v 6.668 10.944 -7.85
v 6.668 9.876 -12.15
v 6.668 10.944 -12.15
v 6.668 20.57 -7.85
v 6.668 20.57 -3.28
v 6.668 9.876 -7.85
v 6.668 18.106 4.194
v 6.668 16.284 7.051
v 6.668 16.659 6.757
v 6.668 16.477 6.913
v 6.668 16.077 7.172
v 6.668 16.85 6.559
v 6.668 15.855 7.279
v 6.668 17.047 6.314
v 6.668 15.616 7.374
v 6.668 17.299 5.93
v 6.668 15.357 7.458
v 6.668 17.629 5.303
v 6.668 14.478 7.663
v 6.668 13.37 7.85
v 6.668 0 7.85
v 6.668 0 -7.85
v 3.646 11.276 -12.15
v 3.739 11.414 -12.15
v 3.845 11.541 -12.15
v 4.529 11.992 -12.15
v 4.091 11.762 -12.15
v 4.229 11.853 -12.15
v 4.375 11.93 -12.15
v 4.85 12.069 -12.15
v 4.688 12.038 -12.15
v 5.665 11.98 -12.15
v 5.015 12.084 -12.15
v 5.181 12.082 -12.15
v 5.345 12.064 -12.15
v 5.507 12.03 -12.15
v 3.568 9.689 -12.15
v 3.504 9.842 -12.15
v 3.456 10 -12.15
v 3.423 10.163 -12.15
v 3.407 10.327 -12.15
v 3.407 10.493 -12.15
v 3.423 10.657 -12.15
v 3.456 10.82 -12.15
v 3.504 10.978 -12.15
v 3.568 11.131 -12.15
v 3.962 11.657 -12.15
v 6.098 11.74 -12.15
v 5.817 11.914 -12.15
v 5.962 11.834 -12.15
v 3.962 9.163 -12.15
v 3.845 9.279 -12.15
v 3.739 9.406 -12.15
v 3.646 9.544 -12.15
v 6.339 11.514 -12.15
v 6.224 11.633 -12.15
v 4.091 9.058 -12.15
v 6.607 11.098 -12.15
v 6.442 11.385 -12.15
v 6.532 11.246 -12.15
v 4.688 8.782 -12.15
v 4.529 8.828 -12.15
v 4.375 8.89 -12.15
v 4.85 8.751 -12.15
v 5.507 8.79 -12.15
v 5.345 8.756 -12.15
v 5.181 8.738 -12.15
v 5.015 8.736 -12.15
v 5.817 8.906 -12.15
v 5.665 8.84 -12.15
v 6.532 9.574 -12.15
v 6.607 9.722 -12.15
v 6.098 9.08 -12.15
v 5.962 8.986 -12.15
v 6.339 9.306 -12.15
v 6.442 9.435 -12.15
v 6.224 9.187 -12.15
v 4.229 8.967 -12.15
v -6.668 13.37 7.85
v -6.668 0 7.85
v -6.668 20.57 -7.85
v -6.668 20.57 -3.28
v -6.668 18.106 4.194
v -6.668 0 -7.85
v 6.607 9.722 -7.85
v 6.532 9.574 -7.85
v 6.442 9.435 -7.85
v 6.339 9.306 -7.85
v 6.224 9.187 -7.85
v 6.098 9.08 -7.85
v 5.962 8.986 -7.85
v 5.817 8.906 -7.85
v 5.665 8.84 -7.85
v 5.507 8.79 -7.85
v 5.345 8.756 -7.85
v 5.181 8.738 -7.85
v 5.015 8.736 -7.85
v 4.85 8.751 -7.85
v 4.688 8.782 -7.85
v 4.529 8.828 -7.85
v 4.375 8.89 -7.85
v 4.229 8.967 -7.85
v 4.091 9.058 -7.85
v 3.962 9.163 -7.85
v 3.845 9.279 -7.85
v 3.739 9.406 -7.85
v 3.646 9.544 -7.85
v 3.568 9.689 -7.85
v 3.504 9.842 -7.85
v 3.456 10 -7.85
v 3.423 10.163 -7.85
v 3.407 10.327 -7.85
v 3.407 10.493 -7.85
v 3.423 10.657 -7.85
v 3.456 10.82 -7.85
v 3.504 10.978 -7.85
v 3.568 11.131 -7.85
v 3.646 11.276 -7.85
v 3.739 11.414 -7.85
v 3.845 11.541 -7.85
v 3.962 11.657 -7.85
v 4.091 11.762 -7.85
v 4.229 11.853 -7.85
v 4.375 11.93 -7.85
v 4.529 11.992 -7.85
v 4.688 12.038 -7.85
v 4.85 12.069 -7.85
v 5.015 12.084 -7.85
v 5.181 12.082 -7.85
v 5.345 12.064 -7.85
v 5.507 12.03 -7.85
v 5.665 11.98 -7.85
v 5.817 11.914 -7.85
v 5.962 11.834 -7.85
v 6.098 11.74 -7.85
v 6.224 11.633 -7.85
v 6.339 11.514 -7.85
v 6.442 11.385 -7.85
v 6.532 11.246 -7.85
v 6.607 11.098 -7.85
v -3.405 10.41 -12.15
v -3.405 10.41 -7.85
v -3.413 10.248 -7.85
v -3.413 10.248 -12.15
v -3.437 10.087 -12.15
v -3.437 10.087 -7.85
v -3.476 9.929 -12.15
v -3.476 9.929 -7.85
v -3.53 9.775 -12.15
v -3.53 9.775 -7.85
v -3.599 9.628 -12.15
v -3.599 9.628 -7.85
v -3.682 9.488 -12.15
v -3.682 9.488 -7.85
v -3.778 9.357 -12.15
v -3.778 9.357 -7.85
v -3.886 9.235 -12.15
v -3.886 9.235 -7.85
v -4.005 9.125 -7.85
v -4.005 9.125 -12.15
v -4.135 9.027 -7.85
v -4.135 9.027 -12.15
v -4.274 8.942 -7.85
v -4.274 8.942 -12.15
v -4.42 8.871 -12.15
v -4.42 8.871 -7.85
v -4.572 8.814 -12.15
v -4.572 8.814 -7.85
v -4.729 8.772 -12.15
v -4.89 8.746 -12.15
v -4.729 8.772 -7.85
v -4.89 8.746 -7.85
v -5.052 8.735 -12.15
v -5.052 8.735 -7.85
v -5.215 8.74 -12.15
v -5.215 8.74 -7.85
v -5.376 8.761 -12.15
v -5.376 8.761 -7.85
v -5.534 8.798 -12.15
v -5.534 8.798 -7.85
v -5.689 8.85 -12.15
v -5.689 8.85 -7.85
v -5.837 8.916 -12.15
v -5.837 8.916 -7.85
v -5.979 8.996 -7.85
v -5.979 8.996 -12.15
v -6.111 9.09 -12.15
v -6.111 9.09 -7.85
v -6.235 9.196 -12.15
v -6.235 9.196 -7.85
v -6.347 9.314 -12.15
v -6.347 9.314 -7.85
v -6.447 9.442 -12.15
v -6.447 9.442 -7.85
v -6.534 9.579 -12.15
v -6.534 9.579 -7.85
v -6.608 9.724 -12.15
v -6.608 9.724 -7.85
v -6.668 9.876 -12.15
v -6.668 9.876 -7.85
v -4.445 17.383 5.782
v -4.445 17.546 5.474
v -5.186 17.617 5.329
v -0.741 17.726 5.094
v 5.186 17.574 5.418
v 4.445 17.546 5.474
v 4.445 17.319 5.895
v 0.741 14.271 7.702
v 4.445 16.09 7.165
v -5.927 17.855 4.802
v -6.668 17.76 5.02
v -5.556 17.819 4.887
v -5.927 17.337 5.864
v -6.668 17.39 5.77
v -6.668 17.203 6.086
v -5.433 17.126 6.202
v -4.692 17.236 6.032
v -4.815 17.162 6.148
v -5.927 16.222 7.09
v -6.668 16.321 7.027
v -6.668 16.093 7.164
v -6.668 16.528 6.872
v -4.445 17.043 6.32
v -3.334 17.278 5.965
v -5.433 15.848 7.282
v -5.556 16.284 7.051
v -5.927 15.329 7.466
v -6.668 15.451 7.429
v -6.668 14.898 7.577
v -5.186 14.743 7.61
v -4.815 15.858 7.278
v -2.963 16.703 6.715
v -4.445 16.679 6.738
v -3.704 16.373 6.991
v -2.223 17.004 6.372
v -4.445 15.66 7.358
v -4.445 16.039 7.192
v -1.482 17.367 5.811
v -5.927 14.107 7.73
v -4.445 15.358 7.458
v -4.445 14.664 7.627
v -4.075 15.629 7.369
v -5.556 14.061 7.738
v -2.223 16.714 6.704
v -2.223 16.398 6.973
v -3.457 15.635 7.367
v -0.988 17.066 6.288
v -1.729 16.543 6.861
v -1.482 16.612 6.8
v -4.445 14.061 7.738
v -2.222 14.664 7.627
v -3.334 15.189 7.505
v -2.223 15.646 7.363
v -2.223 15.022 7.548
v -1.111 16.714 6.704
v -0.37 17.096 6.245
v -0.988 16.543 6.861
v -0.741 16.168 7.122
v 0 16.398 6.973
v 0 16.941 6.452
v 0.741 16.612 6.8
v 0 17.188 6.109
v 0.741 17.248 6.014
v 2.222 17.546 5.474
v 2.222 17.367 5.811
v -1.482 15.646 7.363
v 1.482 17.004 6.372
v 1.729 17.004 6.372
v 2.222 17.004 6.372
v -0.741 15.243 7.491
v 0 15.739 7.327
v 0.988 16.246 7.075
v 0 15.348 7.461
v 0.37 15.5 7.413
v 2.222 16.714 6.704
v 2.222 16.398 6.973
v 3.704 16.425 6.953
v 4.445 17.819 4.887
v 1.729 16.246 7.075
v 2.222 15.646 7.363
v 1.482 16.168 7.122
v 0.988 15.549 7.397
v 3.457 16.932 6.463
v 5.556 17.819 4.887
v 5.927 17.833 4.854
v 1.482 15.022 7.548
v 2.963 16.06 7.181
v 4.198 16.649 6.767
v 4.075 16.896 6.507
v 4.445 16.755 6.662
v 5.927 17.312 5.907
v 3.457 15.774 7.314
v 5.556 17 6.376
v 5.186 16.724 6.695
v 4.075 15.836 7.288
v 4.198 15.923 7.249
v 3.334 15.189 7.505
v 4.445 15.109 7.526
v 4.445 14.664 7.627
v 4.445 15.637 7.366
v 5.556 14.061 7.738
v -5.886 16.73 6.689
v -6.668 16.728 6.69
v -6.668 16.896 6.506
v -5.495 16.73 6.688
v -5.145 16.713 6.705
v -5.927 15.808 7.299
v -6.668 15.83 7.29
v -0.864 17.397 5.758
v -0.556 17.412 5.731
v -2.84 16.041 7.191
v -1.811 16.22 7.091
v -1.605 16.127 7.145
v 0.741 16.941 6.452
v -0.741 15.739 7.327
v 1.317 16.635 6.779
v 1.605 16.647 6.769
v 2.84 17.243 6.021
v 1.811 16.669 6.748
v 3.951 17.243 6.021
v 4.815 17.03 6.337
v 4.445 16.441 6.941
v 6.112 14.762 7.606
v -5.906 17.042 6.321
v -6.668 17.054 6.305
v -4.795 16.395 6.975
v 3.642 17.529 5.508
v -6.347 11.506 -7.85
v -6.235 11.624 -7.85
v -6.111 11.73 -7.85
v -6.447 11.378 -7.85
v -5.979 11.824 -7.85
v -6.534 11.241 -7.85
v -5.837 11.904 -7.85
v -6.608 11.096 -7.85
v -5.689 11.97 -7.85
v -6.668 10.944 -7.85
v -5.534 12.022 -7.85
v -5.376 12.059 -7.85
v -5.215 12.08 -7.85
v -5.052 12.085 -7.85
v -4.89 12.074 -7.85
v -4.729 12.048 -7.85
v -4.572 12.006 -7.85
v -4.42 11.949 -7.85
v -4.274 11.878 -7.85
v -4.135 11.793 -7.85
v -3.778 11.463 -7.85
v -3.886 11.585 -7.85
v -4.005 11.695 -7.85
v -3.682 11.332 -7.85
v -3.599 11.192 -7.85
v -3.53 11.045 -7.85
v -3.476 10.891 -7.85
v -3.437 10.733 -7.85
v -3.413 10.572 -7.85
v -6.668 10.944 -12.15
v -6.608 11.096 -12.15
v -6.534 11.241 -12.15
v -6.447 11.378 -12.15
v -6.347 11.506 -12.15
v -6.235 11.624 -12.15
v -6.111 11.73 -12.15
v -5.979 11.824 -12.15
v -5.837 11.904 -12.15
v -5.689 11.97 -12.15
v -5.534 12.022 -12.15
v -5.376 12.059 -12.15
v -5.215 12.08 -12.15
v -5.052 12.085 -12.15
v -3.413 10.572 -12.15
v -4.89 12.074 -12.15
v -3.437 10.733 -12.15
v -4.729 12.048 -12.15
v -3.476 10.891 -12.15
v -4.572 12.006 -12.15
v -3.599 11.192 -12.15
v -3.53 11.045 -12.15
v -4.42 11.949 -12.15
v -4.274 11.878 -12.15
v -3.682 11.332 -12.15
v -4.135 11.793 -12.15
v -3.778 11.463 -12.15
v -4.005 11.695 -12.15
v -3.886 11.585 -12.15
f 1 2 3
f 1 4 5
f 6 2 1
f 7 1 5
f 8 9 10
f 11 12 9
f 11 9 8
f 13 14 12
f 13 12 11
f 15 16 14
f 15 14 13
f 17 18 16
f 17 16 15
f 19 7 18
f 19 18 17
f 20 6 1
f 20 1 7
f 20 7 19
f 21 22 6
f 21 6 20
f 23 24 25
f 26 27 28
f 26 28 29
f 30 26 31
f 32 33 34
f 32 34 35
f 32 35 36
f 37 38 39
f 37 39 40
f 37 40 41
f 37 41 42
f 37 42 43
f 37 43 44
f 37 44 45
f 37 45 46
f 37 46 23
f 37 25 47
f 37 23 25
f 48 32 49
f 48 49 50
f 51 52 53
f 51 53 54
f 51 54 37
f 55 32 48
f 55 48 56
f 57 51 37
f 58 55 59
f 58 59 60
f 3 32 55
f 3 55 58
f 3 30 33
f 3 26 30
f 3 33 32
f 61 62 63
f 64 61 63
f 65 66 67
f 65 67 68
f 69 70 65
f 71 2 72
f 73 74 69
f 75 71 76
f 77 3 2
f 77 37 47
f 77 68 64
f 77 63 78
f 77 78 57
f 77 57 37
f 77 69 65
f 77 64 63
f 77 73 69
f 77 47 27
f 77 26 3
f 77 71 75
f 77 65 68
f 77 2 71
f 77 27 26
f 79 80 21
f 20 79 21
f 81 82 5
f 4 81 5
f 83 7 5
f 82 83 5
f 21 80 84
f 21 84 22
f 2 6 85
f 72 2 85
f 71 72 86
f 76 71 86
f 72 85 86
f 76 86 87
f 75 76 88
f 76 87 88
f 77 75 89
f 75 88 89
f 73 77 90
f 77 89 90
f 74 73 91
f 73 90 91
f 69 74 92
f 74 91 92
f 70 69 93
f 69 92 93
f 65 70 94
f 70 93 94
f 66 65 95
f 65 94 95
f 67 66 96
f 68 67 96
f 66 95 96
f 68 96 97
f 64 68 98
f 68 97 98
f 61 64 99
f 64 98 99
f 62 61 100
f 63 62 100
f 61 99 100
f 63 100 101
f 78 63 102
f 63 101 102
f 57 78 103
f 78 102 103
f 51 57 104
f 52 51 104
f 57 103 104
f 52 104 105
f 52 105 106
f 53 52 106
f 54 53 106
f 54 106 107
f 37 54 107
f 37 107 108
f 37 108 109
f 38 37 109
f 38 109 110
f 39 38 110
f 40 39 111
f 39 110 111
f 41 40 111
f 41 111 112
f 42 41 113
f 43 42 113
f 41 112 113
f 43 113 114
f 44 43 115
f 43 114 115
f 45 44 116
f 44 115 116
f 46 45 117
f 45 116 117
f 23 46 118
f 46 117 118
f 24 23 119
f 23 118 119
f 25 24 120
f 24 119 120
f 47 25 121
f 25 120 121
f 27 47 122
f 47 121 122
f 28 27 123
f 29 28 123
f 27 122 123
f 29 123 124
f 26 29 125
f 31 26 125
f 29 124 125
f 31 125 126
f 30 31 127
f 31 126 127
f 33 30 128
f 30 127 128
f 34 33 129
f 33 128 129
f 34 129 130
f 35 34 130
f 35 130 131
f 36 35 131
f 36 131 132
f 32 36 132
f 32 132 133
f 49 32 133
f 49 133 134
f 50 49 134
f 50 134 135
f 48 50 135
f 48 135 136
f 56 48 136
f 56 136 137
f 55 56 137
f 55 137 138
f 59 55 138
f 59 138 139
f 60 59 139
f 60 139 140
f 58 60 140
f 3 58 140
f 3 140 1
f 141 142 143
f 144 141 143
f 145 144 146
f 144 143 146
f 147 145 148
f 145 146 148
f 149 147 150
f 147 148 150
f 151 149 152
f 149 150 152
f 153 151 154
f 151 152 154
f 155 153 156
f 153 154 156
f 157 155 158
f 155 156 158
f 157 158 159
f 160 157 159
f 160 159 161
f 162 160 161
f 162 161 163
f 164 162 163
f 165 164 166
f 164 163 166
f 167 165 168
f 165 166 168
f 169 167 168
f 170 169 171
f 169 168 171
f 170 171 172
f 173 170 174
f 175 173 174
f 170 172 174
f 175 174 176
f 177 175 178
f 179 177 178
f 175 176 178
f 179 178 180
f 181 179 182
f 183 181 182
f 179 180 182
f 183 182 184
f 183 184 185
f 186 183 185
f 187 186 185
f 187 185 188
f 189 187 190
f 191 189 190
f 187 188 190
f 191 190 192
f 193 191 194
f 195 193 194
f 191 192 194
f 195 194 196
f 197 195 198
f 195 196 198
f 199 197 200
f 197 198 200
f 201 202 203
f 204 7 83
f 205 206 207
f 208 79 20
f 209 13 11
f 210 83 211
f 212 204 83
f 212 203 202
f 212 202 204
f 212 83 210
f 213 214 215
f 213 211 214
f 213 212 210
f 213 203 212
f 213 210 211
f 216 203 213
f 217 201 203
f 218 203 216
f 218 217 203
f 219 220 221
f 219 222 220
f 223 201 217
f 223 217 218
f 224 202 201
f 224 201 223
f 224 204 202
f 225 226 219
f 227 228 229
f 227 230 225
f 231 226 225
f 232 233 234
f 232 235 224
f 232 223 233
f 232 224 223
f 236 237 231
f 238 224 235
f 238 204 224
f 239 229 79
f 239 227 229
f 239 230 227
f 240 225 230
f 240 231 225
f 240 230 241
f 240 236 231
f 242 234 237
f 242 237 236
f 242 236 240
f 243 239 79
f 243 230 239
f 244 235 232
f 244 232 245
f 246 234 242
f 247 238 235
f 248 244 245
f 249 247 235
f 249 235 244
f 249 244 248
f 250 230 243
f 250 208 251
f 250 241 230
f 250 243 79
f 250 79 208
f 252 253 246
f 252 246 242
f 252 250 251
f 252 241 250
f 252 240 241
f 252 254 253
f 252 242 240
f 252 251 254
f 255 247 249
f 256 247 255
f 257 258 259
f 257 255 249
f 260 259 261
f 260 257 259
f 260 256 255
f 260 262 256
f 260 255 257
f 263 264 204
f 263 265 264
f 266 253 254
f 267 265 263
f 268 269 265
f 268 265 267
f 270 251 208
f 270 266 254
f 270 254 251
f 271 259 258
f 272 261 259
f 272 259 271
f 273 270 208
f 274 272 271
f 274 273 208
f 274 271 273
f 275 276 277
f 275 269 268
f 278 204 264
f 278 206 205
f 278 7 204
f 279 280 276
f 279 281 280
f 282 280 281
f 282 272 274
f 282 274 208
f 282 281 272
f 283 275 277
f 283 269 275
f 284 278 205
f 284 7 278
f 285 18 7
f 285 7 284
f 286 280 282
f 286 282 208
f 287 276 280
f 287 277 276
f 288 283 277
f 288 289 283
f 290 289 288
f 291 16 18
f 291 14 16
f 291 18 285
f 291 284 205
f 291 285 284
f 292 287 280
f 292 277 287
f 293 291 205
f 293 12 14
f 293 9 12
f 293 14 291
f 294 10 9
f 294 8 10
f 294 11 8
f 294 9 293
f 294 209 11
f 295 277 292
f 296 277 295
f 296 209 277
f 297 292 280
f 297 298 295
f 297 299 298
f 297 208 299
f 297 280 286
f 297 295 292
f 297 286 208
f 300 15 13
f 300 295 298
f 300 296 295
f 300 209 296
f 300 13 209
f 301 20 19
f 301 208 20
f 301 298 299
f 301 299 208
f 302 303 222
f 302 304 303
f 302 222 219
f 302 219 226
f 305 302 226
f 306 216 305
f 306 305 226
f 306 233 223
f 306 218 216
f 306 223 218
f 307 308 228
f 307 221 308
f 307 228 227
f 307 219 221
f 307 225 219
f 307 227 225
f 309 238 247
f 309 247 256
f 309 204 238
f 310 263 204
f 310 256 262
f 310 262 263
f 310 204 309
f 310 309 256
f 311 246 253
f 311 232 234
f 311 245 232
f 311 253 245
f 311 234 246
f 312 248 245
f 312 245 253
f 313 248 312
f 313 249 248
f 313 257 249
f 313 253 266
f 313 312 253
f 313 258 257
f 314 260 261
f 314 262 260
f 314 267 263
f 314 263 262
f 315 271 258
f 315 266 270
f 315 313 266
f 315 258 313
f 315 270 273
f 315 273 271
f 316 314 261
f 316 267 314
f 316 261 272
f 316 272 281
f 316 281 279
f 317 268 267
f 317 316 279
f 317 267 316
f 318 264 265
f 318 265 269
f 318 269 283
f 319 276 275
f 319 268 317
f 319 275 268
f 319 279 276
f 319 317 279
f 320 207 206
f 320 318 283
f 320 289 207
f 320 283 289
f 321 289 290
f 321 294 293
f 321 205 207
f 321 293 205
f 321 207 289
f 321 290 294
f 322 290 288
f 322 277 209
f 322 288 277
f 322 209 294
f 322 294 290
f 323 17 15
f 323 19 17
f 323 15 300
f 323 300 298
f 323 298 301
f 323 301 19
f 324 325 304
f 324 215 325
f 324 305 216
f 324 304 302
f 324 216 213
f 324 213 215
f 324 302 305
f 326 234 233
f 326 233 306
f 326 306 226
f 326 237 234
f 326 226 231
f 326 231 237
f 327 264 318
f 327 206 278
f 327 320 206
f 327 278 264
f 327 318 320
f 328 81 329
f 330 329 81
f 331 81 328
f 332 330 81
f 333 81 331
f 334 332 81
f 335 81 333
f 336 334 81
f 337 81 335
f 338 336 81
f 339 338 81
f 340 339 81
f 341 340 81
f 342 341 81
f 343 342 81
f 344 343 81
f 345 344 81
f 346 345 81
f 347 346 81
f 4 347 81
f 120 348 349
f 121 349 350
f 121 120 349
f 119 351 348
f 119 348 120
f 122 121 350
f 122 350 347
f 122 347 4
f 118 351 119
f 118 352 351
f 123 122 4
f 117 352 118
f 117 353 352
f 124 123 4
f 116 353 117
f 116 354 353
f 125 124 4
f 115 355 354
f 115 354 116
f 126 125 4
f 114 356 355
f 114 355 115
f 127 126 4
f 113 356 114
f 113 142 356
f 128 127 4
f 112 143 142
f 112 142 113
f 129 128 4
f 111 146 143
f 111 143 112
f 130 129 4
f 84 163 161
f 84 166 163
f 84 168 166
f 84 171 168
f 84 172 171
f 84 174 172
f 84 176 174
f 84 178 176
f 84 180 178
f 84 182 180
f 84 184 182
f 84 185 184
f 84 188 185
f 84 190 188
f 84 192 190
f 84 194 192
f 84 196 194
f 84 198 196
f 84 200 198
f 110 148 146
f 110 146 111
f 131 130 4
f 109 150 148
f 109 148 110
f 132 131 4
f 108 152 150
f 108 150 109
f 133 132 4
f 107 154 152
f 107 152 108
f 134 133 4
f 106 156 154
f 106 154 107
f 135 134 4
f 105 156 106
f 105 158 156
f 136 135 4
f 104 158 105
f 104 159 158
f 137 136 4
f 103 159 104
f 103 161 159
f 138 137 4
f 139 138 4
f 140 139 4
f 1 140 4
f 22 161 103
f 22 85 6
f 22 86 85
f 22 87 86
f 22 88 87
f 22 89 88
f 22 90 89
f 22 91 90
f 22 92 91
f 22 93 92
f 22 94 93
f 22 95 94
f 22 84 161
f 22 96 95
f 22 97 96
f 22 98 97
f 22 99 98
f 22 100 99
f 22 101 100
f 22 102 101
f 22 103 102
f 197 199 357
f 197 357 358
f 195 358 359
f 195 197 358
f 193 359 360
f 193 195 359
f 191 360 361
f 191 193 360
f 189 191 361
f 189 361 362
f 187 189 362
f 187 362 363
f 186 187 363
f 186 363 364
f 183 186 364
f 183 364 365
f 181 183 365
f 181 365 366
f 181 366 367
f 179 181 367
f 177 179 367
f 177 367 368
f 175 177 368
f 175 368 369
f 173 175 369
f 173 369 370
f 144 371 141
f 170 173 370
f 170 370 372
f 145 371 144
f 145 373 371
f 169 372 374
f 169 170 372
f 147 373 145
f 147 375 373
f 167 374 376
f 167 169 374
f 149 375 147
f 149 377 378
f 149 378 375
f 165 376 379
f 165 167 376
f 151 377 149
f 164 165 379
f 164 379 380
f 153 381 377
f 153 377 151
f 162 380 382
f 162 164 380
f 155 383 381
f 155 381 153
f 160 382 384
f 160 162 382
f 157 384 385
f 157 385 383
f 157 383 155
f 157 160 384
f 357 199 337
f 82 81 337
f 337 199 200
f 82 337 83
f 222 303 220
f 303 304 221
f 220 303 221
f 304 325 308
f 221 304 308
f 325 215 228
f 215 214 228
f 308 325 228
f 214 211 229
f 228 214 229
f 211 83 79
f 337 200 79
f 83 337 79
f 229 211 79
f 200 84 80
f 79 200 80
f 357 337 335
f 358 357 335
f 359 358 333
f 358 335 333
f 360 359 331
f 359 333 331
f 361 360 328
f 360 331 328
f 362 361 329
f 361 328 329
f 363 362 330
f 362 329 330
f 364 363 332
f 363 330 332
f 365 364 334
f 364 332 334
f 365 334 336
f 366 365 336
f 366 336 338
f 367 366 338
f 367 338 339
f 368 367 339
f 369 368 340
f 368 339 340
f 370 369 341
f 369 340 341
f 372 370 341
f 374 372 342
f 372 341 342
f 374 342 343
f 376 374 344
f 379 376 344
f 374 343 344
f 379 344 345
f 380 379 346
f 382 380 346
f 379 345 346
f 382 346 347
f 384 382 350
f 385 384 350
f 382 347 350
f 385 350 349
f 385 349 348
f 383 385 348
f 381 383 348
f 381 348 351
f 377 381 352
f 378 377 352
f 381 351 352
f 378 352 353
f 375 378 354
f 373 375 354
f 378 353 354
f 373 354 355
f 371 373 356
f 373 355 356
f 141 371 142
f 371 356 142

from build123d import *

# Parameters (mm, degrees)
F0_W     = 13.335
F0_H     = 15.7
F1_DEPTH = 20.57
F3_DEPTH = 4.3
F5_DEPTH = 13.336


with BuildPart() as f1:
    # F0 (on Front) → F1 (new body)
    with BuildSketch(Plane.XZ):
        Rectangle(F0_W, F0_H)
    extrude(amount=-F1_DEPTH)

    # F2 (on face) → F3 (join)
    with BuildSketch(Plane(origin=(0, 0, -7.85), x_dir=(1, 0, 0), z_dir=(0, 0, -1))):
        with BuildLine():
            Line((6.6675, -10.9442927568), (6.6675, -9.8757072432))
            ThreePointArc((6.6675, -9.8757072432), (3.405, -10.41), (6.6675, -10.9442927568))
        make_face()
        with BuildLine():
            ThreePointArc((-3.405, -10.41), (-4.8092949022, -8.757019737), (-6.6675, -9.8757072432))
            Line((-6.6675, -9.8757072432), (-6.6675, -10.9442927568))
            ThreePointArc((-6.6675, -10.9442927568), (-4.8092949022, -12.062980263), (-3.405, -10.41))
        make_face()
    extrude(amount=F3_DEPTH)

    # F4 (on face) → F5 (cut, through all)
    with BuildSketch(Plane.YZ.offset(6.6675)):
        with BuildLine():
            Line((18.1063264608, 4.1939658113), (20.57, -3.2797483727))
            Line((20.57, -3.2797483727), (20.57, 7.85))
            Line((20.57, 7.85), (13.3700780571, 7.85))
            add(Edge.make_bspline(
                [(18.1063264608, 4.1939658113), (16.9114023447, 7.1921413764), (16.3248032331, 7.3876748793), (13.3700780571, 7.85)],
                knots=[0, 0, 0, 0, 5.9831960466, 5.9831960466, 5.9831960466, 5.9831960466], degree=3))
        make_face()
    extrude(amount=-F5_DEPTH, mode=Mode.SUBTRACT)


solid = f1.part
